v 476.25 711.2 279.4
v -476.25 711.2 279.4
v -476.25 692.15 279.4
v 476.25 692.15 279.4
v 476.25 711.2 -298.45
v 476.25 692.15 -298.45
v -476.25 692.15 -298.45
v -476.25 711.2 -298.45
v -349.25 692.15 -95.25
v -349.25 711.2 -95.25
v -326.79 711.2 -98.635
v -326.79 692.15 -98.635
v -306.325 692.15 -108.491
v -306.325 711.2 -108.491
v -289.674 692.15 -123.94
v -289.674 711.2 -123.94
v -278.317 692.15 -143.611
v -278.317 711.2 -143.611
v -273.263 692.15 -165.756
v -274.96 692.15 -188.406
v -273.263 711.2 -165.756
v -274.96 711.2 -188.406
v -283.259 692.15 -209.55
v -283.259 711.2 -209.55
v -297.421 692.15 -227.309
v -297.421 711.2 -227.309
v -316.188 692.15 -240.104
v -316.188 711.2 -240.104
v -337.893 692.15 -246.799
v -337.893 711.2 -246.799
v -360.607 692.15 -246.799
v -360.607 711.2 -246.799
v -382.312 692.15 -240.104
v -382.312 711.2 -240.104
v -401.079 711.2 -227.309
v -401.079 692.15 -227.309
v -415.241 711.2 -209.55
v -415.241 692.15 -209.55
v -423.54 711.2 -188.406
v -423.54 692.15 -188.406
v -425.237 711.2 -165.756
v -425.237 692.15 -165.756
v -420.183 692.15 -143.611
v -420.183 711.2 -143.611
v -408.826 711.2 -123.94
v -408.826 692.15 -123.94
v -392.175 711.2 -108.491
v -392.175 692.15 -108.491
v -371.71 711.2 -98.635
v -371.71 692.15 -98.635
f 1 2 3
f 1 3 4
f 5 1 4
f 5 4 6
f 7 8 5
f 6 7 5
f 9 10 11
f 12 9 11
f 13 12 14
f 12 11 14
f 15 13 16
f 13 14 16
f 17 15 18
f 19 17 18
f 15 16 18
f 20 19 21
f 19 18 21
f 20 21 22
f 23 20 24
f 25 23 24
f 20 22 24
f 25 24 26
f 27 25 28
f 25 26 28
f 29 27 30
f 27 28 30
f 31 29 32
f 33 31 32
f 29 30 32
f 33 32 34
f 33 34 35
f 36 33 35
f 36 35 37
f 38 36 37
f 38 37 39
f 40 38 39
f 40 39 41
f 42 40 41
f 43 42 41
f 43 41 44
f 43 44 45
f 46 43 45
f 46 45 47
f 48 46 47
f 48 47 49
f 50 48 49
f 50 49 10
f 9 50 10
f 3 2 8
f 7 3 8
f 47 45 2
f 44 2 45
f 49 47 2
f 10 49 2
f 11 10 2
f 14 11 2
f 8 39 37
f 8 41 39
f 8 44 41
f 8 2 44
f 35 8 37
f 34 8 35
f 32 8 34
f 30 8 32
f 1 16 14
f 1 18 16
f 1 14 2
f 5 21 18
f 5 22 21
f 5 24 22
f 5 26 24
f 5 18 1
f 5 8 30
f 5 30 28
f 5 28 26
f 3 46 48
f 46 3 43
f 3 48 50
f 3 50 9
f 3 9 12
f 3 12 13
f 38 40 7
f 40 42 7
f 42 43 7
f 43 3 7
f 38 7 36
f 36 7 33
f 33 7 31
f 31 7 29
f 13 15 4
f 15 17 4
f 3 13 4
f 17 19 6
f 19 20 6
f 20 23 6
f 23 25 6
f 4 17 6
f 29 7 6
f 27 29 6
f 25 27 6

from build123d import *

# Parameters (mm, degrees)
SKETCH3_W           = 952.5
SKETCH3_H           = 577.85
BOSS_EXTRUDE2_DEPTH = 19.05
SKETCH4_R           = 76.2
CUT_EXTRUDE1_DEPTH  = 563.360531599


with BuildPart() as part:
    # Sketch3 → Boss-Extrude2 (new body)
    with BuildSketch(Plane(origin=(0, 711.2, 0), x_dir=(1, 0, 0), z_dir=(0, 1, 0))):
        with Locations((0, 9.525)):
            Rectangle(SKETCH3_W, SKETCH3_H)
    extrude(amount=-BOSS_EXTRUDE2_DEPTH)

    # Sketch4 → Cut-Extrude1 (cut, through all)
    with BuildSketch(Plane(origin=(0, 711.2, 0), x_dir=(1, 0, 0), z_dir=(0, 1, 0))):
        with Locations(Location((-349.25, 171.45, 0), (0, 0, 270))):
            Circle(SKETCH4_R)
    extrude(amount=-CUT_EXTRUDE1_DEPTH, mode=Mode.SUBTRACT)


solid = part.part
